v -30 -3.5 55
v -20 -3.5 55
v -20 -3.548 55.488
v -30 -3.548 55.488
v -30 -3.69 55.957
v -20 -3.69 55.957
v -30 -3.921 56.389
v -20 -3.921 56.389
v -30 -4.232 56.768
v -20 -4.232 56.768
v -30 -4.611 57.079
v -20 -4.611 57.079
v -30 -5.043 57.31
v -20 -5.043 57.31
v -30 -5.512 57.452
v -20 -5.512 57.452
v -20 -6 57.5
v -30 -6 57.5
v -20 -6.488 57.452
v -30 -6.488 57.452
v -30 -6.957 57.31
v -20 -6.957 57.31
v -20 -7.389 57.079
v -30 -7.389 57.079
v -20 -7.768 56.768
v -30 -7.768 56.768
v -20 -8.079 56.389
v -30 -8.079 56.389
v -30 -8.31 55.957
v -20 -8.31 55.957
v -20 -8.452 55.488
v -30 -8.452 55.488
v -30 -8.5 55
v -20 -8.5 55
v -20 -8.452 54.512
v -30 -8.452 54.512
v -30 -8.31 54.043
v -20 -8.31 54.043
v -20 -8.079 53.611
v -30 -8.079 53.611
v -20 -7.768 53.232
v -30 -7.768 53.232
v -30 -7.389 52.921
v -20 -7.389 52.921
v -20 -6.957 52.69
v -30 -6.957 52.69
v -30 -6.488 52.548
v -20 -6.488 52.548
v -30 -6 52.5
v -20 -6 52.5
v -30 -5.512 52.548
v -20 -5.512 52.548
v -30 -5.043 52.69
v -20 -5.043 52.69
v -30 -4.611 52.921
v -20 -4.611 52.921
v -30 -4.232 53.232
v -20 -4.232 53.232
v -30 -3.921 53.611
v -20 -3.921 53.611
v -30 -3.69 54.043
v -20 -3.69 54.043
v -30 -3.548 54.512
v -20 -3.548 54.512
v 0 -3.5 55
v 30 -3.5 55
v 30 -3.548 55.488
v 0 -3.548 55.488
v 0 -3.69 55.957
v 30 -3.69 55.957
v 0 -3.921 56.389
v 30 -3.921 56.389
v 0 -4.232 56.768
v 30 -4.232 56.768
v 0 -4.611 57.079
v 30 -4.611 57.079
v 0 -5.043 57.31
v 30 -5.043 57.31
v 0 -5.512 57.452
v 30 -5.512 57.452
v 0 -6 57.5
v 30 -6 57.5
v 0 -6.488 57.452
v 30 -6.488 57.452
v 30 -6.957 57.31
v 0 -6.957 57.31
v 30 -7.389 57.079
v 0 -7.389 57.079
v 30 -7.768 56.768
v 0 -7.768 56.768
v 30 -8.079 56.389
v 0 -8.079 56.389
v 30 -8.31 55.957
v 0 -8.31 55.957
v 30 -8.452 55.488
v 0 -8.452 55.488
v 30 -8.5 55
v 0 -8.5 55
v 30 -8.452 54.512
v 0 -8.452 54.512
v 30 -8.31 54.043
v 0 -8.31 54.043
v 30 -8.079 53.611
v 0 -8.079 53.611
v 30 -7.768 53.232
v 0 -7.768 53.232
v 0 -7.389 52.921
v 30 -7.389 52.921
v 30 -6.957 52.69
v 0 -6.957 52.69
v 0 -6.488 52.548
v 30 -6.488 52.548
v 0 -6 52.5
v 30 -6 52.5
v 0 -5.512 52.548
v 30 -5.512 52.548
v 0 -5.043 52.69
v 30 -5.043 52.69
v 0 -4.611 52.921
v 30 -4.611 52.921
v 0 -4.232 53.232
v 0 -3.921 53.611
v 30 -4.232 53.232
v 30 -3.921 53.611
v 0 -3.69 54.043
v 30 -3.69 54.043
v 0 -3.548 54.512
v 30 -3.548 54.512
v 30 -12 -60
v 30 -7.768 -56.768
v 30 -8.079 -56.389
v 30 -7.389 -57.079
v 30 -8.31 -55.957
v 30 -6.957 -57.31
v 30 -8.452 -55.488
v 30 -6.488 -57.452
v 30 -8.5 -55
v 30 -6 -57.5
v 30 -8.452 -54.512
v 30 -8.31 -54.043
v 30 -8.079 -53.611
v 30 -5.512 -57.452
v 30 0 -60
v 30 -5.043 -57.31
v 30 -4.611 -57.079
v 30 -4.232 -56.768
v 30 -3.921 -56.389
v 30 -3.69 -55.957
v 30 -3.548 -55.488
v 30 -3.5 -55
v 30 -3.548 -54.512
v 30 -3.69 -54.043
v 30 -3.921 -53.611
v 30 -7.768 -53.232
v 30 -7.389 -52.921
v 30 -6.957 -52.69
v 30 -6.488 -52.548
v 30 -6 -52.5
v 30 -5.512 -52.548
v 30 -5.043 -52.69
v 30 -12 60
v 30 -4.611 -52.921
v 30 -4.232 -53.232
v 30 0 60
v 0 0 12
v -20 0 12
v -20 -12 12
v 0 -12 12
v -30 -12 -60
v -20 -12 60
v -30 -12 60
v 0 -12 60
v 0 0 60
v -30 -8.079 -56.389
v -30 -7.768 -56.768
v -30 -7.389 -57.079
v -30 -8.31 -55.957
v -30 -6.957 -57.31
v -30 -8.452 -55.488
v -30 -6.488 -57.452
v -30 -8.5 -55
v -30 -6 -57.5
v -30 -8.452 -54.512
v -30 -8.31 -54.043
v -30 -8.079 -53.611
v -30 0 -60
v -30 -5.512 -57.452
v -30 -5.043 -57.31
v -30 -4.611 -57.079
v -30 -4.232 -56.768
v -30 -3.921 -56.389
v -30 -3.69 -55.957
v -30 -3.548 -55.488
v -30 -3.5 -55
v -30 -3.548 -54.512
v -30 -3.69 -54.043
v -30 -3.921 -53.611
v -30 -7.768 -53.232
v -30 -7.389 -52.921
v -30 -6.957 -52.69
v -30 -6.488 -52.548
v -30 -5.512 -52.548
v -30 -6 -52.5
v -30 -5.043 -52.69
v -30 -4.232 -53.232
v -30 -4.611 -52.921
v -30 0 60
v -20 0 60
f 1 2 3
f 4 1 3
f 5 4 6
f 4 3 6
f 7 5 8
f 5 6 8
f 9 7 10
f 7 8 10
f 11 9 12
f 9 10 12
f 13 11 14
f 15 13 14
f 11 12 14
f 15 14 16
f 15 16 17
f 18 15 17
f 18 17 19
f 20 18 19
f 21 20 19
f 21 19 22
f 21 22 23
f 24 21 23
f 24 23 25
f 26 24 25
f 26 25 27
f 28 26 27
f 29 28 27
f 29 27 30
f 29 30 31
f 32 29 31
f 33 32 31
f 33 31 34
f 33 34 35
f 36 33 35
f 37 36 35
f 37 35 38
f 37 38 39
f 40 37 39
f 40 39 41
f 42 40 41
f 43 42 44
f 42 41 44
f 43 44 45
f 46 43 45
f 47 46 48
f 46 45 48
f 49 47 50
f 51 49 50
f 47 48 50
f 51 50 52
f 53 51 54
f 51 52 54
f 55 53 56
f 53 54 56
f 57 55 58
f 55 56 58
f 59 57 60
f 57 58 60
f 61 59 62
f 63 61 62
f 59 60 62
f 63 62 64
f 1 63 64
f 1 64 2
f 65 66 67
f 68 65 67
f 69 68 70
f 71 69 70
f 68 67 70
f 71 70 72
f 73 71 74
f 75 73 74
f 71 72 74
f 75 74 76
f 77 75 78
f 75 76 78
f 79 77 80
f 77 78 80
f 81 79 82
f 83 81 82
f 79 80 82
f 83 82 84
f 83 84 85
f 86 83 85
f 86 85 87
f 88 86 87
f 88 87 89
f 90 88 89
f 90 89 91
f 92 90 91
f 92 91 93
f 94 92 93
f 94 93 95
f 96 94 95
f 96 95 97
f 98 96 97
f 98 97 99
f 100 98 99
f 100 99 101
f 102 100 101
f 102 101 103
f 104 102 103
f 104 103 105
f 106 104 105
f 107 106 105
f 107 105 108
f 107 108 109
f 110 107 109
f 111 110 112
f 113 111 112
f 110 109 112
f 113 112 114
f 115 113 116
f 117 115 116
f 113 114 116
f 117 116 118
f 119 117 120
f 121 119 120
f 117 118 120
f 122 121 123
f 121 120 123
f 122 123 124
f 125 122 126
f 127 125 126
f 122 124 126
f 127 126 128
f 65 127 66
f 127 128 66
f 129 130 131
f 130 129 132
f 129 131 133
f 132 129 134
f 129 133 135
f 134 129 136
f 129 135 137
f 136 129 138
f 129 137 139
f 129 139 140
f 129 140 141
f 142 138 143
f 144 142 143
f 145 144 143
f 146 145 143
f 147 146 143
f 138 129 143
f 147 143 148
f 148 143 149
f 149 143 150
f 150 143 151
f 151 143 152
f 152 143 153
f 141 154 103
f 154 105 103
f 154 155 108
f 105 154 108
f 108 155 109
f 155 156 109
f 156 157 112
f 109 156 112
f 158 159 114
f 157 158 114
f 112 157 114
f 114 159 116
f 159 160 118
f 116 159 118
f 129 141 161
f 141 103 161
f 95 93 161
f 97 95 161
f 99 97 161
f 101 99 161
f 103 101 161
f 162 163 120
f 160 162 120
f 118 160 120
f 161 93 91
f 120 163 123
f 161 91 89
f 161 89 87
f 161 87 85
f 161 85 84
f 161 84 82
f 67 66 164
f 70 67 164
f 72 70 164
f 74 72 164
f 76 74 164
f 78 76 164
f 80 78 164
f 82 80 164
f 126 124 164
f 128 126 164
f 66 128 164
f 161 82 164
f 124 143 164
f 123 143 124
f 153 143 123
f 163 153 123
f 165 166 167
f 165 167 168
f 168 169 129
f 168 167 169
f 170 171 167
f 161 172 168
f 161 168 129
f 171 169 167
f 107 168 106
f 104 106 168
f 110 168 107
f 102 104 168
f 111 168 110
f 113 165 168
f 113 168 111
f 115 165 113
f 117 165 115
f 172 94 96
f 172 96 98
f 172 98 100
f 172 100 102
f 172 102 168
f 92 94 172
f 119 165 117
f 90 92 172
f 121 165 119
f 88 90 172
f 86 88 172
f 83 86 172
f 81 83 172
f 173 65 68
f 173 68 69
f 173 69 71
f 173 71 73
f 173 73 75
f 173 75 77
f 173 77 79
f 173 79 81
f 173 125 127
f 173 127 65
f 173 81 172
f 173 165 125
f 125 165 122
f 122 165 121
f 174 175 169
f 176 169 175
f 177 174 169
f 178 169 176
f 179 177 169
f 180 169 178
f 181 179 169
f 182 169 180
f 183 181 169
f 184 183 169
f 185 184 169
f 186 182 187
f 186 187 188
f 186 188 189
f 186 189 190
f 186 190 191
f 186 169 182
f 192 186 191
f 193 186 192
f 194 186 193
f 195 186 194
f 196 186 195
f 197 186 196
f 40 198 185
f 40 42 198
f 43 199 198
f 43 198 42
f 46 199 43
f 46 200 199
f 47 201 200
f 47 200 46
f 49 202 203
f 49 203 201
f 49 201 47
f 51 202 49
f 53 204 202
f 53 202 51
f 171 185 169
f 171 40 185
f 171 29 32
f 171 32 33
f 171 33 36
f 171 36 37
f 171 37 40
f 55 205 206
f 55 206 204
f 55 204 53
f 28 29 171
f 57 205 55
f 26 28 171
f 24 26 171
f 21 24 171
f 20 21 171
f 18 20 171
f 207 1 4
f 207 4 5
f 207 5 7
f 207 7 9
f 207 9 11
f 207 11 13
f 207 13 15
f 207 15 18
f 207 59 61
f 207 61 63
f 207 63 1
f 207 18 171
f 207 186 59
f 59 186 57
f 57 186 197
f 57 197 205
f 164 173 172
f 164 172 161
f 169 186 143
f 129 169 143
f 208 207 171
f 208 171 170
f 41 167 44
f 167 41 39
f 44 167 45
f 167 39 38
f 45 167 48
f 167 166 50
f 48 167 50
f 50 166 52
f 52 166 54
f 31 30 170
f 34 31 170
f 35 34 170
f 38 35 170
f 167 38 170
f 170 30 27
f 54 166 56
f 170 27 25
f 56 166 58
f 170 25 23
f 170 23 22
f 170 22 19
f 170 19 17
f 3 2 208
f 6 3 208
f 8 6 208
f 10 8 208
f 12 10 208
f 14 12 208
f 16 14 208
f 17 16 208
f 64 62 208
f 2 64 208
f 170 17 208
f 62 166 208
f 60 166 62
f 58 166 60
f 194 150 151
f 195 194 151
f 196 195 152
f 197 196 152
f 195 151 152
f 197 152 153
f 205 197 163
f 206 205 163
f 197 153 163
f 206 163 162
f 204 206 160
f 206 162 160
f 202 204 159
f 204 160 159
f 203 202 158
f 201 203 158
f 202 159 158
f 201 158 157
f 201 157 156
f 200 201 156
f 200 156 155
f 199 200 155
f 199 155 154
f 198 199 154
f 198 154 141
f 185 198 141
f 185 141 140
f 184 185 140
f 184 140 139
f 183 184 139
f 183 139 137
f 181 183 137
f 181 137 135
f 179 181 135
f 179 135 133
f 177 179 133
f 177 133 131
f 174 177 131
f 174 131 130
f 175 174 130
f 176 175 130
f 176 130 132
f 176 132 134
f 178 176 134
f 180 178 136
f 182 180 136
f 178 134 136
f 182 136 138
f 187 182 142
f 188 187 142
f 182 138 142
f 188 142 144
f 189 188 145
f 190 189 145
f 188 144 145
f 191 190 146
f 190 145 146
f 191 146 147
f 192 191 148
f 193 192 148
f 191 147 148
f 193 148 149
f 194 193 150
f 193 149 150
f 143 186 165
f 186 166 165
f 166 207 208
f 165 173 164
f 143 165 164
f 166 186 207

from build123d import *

# Parameters (mm, degrees)
F0_W     = 60
F0_H     = 120
F2_DEPTH = 12
F1_W     = 20
F1_H     = 48
F3_DEPTH = 12
F4_R     = 2.5
F5_DEPTH = 60.001
F6_R     = 2.5
F7_DEPTH = 152.4


with BuildPart() as f2:
    # F0 (on Front) → F2 (new body)
    with BuildSketch(Plane.XZ):
        Rectangle(F0_W, F0_H)
    extrude(amount=F2_DEPTH)

    # F1 (on face) → F3 (cut, through all)
    with BuildSketch(Plane.XZ):
        with Locations((-10, 36)):
            Rectangle(F1_W, F1_H)
    extrude(amount=F3_DEPTH, mode=Mode.SUBTRACT)

    # F4 (on face) → F5 (cut, through all)
    with BuildSketch(Plane.YZ.offset(30)):
        with Locations((-6, 55)):
            Circle(F4_R)
    extrude(amount=-F5_DEPTH, mode=Mode.SUBTRACT)

    # F6 (on face) → F7 (cut)
    with BuildSketch(Plane.YZ.offset(30)):
        with Locations((-6, -55)):
            Circle(F6_R)
    extrude(amount=-F7_DEPTH, mode=Mode.SUBTRACT)


solid = f2.part
